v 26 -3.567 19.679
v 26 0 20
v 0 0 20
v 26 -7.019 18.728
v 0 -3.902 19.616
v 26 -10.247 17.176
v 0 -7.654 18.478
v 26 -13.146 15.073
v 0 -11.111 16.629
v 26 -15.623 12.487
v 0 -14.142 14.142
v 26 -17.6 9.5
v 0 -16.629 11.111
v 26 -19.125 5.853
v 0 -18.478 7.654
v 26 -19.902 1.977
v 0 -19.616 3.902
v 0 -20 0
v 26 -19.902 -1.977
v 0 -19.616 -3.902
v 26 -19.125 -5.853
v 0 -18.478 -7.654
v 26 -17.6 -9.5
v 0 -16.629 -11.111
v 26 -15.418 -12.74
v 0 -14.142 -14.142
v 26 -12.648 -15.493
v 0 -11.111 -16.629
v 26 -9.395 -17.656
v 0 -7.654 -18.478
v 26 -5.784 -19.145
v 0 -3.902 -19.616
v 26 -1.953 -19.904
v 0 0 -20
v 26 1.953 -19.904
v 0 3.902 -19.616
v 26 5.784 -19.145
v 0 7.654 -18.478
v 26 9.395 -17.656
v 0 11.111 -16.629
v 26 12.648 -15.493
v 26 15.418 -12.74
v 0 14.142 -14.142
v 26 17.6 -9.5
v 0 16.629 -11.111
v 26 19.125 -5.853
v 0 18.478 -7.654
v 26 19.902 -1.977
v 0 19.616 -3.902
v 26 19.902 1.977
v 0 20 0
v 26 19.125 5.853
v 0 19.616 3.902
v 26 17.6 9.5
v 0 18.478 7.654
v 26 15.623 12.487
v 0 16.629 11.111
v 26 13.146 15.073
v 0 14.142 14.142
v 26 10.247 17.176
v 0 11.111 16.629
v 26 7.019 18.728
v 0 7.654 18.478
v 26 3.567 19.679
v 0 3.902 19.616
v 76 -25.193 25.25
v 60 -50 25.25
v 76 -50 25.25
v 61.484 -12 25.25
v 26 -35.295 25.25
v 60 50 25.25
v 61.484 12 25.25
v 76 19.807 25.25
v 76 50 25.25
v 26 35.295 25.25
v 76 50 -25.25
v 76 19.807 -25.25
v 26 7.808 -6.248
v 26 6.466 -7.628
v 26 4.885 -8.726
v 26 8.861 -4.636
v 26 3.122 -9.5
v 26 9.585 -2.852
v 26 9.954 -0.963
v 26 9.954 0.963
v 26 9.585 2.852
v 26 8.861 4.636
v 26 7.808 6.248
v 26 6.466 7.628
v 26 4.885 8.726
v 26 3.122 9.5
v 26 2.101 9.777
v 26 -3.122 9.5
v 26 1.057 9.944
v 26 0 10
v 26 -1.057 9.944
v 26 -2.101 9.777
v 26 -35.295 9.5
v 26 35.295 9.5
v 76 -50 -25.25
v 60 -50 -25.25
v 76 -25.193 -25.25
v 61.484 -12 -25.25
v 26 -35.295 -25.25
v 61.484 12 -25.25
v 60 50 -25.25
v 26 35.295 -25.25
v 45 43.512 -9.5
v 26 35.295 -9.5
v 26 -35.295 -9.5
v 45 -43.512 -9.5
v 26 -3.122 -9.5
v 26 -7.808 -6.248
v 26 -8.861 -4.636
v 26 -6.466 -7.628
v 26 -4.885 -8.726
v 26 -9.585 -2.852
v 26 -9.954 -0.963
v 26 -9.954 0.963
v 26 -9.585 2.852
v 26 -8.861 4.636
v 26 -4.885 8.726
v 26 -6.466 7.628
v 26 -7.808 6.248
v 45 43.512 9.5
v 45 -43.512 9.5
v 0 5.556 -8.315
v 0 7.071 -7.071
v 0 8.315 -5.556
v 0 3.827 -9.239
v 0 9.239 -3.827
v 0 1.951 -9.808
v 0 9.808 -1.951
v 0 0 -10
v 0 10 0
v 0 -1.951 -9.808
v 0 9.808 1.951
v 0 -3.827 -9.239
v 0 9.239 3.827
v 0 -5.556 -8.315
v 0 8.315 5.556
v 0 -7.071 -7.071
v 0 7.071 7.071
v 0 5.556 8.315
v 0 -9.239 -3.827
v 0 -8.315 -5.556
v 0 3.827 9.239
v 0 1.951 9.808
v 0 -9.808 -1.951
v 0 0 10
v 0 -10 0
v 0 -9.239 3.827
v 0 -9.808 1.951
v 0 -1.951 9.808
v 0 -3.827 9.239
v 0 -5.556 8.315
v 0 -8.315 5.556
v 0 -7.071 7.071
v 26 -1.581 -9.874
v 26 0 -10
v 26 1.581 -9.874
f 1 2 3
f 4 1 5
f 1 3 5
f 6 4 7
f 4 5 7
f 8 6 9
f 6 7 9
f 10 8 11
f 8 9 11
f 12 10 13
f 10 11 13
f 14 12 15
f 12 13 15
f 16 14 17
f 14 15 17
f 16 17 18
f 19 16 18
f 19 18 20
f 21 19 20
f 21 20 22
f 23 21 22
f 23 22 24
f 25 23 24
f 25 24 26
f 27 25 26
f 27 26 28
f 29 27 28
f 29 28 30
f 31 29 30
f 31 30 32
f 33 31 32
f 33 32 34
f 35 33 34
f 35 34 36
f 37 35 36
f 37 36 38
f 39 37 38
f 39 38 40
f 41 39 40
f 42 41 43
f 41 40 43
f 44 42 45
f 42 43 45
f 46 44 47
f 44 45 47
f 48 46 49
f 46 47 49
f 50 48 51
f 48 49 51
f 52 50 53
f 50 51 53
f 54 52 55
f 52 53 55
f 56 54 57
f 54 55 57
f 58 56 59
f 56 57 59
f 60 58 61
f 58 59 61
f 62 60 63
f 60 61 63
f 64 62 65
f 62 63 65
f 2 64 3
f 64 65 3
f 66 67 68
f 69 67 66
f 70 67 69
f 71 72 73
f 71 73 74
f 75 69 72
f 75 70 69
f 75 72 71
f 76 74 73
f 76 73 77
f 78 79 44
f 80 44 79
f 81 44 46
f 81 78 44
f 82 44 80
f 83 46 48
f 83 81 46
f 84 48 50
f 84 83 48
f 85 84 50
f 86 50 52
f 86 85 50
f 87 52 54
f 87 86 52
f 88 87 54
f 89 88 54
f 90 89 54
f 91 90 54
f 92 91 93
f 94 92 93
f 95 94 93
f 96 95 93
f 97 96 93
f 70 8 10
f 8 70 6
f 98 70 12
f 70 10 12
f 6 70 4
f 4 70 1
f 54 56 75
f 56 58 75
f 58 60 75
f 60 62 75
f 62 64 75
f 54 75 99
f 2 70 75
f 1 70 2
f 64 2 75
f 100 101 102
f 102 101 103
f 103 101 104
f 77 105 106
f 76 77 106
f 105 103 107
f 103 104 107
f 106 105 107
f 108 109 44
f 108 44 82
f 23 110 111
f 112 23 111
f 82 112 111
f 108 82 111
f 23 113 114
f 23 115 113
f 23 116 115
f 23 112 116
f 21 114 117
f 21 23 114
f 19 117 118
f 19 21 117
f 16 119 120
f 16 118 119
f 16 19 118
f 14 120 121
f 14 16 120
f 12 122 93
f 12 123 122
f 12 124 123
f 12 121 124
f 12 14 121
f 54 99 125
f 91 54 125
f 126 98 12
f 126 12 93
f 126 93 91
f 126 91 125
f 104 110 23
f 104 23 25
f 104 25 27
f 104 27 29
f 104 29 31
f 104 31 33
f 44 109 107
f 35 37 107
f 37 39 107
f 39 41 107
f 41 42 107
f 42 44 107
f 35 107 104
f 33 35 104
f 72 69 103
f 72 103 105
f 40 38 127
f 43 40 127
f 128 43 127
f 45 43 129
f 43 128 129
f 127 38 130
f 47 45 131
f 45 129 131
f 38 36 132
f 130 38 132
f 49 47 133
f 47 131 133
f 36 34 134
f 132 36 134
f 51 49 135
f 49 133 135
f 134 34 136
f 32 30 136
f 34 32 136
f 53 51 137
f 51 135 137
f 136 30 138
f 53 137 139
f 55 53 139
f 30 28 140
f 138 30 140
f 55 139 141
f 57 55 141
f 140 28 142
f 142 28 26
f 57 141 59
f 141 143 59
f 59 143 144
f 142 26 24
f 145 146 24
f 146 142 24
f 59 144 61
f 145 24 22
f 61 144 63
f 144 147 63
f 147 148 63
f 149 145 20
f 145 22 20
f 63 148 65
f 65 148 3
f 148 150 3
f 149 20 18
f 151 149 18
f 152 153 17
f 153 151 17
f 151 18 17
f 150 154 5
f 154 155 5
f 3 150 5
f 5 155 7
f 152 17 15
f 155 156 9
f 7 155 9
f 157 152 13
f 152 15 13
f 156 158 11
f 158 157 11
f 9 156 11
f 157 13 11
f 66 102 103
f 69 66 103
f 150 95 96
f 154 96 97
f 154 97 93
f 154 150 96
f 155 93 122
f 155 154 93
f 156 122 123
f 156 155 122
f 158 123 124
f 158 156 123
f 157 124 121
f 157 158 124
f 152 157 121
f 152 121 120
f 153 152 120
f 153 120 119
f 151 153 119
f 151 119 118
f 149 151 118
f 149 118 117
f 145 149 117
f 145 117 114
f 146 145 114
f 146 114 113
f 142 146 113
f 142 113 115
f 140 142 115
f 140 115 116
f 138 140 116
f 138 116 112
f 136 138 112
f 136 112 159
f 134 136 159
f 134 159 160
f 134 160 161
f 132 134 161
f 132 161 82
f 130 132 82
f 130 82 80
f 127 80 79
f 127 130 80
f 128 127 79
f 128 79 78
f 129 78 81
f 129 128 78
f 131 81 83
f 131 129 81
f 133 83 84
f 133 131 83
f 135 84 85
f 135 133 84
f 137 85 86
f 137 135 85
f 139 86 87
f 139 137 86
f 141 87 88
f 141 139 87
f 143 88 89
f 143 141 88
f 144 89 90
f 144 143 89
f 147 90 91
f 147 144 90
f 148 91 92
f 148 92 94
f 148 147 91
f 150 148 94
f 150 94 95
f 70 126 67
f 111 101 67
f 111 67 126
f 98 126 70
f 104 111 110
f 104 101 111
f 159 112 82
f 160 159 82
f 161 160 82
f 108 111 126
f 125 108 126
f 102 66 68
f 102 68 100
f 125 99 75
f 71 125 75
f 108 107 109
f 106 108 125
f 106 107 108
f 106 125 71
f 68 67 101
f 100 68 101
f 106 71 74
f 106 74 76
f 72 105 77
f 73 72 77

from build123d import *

# Parameters (mm, degrees)
SKETCH2_R           = 20
SKETCH2_R_2         = 10
BOSS_EXTRUDE1_DEPTH = 26
SKETCH3_W           = 50.5
SKETCH3_H           = 100
BOSS_EXTRUDE2_DEPTH = 50
SKETCH6_W           = 19
SKETCH6_H           = 19
CUT_EXTRUDE1_DEPTH  = 129.115426472
CUT_EXTRUDE5_DEPTH  = 105.049267177
CUT_EXTRUDE6_DEPTH  = 105.049267177


with BuildPart() as part:
    # Sketch2 → Boss-Extrude1 (new body)
    with BuildSketch(Plane(origin=(0, 0, 0), x_dir=(0, 0, -1), z_dir=(1, 0, 0))):
        with Locations(Location((0, 0, 0), (0, 0, 180))):
            Circle(SKETCH2_R)
        with Locations(Location((0, 0, 0), (0, 0, 180))):
            Circle(SKETCH2_R_2, mode=Mode.SUBTRACT)
    extrude(amount=BOSS_EXTRUDE1_DEPTH)

    # Sketch3 → Boss-Extrude2 (add)
    with BuildSketch(Plane(origin=(26, 0, 0), x_dir=(0, 0, -1), z_dir=(1, 0, 0))):
        Rectangle(SKETCH3_W, SKETCH3_H)
    extrude(amount=BOSS_EXTRUDE2_DEPTH)

    # Sketch6 → Cut-Extrude1 (cut, through all)
    with BuildSketch(Plane.XZ.offset(50)):
        with Locations((35.5, 0)):
            Rectangle(SKETCH6_W, SKETCH6_H)
    extrude(amount=-CUT_EXTRUDE1_DEPTH, mode=Mode.SUBTRACT)

    # Sketch7 → Cut-Extrude5 (cut, through all)
    with BuildSketch(Plane(origin=(0, 0, -25.25), x_dir=(-1, 0, 0), z_dir=(0, 0, -1))):
        Polygon((-60, 50), (-26, 50), (-26, 35.294942904), align=None)
        Polygon((-60, -50), (-26, -35.294942904), (-26, -50), align=None)
    extrude(amount=-CUT_EXTRUDE5_DEPTH, mode=Mode.SUBTRACT)

    # Sketch9 → Cut-Extrude6 (cut, through all)
    with BuildSketch(Plane(origin=(0, 0, -25.25), x_dir=(-1, 0, 0), z_dir=(0, 0, -1))):
        Polygon((-76, 19.807249774), (-76, -25.192750226), (-61.483507586, -12), (-61.483507586, 12), align=None)
    extrude(amount=-CUT_EXTRUDE6_DEPTH, mode=Mode.SUBTRACT)


solid = part.part
